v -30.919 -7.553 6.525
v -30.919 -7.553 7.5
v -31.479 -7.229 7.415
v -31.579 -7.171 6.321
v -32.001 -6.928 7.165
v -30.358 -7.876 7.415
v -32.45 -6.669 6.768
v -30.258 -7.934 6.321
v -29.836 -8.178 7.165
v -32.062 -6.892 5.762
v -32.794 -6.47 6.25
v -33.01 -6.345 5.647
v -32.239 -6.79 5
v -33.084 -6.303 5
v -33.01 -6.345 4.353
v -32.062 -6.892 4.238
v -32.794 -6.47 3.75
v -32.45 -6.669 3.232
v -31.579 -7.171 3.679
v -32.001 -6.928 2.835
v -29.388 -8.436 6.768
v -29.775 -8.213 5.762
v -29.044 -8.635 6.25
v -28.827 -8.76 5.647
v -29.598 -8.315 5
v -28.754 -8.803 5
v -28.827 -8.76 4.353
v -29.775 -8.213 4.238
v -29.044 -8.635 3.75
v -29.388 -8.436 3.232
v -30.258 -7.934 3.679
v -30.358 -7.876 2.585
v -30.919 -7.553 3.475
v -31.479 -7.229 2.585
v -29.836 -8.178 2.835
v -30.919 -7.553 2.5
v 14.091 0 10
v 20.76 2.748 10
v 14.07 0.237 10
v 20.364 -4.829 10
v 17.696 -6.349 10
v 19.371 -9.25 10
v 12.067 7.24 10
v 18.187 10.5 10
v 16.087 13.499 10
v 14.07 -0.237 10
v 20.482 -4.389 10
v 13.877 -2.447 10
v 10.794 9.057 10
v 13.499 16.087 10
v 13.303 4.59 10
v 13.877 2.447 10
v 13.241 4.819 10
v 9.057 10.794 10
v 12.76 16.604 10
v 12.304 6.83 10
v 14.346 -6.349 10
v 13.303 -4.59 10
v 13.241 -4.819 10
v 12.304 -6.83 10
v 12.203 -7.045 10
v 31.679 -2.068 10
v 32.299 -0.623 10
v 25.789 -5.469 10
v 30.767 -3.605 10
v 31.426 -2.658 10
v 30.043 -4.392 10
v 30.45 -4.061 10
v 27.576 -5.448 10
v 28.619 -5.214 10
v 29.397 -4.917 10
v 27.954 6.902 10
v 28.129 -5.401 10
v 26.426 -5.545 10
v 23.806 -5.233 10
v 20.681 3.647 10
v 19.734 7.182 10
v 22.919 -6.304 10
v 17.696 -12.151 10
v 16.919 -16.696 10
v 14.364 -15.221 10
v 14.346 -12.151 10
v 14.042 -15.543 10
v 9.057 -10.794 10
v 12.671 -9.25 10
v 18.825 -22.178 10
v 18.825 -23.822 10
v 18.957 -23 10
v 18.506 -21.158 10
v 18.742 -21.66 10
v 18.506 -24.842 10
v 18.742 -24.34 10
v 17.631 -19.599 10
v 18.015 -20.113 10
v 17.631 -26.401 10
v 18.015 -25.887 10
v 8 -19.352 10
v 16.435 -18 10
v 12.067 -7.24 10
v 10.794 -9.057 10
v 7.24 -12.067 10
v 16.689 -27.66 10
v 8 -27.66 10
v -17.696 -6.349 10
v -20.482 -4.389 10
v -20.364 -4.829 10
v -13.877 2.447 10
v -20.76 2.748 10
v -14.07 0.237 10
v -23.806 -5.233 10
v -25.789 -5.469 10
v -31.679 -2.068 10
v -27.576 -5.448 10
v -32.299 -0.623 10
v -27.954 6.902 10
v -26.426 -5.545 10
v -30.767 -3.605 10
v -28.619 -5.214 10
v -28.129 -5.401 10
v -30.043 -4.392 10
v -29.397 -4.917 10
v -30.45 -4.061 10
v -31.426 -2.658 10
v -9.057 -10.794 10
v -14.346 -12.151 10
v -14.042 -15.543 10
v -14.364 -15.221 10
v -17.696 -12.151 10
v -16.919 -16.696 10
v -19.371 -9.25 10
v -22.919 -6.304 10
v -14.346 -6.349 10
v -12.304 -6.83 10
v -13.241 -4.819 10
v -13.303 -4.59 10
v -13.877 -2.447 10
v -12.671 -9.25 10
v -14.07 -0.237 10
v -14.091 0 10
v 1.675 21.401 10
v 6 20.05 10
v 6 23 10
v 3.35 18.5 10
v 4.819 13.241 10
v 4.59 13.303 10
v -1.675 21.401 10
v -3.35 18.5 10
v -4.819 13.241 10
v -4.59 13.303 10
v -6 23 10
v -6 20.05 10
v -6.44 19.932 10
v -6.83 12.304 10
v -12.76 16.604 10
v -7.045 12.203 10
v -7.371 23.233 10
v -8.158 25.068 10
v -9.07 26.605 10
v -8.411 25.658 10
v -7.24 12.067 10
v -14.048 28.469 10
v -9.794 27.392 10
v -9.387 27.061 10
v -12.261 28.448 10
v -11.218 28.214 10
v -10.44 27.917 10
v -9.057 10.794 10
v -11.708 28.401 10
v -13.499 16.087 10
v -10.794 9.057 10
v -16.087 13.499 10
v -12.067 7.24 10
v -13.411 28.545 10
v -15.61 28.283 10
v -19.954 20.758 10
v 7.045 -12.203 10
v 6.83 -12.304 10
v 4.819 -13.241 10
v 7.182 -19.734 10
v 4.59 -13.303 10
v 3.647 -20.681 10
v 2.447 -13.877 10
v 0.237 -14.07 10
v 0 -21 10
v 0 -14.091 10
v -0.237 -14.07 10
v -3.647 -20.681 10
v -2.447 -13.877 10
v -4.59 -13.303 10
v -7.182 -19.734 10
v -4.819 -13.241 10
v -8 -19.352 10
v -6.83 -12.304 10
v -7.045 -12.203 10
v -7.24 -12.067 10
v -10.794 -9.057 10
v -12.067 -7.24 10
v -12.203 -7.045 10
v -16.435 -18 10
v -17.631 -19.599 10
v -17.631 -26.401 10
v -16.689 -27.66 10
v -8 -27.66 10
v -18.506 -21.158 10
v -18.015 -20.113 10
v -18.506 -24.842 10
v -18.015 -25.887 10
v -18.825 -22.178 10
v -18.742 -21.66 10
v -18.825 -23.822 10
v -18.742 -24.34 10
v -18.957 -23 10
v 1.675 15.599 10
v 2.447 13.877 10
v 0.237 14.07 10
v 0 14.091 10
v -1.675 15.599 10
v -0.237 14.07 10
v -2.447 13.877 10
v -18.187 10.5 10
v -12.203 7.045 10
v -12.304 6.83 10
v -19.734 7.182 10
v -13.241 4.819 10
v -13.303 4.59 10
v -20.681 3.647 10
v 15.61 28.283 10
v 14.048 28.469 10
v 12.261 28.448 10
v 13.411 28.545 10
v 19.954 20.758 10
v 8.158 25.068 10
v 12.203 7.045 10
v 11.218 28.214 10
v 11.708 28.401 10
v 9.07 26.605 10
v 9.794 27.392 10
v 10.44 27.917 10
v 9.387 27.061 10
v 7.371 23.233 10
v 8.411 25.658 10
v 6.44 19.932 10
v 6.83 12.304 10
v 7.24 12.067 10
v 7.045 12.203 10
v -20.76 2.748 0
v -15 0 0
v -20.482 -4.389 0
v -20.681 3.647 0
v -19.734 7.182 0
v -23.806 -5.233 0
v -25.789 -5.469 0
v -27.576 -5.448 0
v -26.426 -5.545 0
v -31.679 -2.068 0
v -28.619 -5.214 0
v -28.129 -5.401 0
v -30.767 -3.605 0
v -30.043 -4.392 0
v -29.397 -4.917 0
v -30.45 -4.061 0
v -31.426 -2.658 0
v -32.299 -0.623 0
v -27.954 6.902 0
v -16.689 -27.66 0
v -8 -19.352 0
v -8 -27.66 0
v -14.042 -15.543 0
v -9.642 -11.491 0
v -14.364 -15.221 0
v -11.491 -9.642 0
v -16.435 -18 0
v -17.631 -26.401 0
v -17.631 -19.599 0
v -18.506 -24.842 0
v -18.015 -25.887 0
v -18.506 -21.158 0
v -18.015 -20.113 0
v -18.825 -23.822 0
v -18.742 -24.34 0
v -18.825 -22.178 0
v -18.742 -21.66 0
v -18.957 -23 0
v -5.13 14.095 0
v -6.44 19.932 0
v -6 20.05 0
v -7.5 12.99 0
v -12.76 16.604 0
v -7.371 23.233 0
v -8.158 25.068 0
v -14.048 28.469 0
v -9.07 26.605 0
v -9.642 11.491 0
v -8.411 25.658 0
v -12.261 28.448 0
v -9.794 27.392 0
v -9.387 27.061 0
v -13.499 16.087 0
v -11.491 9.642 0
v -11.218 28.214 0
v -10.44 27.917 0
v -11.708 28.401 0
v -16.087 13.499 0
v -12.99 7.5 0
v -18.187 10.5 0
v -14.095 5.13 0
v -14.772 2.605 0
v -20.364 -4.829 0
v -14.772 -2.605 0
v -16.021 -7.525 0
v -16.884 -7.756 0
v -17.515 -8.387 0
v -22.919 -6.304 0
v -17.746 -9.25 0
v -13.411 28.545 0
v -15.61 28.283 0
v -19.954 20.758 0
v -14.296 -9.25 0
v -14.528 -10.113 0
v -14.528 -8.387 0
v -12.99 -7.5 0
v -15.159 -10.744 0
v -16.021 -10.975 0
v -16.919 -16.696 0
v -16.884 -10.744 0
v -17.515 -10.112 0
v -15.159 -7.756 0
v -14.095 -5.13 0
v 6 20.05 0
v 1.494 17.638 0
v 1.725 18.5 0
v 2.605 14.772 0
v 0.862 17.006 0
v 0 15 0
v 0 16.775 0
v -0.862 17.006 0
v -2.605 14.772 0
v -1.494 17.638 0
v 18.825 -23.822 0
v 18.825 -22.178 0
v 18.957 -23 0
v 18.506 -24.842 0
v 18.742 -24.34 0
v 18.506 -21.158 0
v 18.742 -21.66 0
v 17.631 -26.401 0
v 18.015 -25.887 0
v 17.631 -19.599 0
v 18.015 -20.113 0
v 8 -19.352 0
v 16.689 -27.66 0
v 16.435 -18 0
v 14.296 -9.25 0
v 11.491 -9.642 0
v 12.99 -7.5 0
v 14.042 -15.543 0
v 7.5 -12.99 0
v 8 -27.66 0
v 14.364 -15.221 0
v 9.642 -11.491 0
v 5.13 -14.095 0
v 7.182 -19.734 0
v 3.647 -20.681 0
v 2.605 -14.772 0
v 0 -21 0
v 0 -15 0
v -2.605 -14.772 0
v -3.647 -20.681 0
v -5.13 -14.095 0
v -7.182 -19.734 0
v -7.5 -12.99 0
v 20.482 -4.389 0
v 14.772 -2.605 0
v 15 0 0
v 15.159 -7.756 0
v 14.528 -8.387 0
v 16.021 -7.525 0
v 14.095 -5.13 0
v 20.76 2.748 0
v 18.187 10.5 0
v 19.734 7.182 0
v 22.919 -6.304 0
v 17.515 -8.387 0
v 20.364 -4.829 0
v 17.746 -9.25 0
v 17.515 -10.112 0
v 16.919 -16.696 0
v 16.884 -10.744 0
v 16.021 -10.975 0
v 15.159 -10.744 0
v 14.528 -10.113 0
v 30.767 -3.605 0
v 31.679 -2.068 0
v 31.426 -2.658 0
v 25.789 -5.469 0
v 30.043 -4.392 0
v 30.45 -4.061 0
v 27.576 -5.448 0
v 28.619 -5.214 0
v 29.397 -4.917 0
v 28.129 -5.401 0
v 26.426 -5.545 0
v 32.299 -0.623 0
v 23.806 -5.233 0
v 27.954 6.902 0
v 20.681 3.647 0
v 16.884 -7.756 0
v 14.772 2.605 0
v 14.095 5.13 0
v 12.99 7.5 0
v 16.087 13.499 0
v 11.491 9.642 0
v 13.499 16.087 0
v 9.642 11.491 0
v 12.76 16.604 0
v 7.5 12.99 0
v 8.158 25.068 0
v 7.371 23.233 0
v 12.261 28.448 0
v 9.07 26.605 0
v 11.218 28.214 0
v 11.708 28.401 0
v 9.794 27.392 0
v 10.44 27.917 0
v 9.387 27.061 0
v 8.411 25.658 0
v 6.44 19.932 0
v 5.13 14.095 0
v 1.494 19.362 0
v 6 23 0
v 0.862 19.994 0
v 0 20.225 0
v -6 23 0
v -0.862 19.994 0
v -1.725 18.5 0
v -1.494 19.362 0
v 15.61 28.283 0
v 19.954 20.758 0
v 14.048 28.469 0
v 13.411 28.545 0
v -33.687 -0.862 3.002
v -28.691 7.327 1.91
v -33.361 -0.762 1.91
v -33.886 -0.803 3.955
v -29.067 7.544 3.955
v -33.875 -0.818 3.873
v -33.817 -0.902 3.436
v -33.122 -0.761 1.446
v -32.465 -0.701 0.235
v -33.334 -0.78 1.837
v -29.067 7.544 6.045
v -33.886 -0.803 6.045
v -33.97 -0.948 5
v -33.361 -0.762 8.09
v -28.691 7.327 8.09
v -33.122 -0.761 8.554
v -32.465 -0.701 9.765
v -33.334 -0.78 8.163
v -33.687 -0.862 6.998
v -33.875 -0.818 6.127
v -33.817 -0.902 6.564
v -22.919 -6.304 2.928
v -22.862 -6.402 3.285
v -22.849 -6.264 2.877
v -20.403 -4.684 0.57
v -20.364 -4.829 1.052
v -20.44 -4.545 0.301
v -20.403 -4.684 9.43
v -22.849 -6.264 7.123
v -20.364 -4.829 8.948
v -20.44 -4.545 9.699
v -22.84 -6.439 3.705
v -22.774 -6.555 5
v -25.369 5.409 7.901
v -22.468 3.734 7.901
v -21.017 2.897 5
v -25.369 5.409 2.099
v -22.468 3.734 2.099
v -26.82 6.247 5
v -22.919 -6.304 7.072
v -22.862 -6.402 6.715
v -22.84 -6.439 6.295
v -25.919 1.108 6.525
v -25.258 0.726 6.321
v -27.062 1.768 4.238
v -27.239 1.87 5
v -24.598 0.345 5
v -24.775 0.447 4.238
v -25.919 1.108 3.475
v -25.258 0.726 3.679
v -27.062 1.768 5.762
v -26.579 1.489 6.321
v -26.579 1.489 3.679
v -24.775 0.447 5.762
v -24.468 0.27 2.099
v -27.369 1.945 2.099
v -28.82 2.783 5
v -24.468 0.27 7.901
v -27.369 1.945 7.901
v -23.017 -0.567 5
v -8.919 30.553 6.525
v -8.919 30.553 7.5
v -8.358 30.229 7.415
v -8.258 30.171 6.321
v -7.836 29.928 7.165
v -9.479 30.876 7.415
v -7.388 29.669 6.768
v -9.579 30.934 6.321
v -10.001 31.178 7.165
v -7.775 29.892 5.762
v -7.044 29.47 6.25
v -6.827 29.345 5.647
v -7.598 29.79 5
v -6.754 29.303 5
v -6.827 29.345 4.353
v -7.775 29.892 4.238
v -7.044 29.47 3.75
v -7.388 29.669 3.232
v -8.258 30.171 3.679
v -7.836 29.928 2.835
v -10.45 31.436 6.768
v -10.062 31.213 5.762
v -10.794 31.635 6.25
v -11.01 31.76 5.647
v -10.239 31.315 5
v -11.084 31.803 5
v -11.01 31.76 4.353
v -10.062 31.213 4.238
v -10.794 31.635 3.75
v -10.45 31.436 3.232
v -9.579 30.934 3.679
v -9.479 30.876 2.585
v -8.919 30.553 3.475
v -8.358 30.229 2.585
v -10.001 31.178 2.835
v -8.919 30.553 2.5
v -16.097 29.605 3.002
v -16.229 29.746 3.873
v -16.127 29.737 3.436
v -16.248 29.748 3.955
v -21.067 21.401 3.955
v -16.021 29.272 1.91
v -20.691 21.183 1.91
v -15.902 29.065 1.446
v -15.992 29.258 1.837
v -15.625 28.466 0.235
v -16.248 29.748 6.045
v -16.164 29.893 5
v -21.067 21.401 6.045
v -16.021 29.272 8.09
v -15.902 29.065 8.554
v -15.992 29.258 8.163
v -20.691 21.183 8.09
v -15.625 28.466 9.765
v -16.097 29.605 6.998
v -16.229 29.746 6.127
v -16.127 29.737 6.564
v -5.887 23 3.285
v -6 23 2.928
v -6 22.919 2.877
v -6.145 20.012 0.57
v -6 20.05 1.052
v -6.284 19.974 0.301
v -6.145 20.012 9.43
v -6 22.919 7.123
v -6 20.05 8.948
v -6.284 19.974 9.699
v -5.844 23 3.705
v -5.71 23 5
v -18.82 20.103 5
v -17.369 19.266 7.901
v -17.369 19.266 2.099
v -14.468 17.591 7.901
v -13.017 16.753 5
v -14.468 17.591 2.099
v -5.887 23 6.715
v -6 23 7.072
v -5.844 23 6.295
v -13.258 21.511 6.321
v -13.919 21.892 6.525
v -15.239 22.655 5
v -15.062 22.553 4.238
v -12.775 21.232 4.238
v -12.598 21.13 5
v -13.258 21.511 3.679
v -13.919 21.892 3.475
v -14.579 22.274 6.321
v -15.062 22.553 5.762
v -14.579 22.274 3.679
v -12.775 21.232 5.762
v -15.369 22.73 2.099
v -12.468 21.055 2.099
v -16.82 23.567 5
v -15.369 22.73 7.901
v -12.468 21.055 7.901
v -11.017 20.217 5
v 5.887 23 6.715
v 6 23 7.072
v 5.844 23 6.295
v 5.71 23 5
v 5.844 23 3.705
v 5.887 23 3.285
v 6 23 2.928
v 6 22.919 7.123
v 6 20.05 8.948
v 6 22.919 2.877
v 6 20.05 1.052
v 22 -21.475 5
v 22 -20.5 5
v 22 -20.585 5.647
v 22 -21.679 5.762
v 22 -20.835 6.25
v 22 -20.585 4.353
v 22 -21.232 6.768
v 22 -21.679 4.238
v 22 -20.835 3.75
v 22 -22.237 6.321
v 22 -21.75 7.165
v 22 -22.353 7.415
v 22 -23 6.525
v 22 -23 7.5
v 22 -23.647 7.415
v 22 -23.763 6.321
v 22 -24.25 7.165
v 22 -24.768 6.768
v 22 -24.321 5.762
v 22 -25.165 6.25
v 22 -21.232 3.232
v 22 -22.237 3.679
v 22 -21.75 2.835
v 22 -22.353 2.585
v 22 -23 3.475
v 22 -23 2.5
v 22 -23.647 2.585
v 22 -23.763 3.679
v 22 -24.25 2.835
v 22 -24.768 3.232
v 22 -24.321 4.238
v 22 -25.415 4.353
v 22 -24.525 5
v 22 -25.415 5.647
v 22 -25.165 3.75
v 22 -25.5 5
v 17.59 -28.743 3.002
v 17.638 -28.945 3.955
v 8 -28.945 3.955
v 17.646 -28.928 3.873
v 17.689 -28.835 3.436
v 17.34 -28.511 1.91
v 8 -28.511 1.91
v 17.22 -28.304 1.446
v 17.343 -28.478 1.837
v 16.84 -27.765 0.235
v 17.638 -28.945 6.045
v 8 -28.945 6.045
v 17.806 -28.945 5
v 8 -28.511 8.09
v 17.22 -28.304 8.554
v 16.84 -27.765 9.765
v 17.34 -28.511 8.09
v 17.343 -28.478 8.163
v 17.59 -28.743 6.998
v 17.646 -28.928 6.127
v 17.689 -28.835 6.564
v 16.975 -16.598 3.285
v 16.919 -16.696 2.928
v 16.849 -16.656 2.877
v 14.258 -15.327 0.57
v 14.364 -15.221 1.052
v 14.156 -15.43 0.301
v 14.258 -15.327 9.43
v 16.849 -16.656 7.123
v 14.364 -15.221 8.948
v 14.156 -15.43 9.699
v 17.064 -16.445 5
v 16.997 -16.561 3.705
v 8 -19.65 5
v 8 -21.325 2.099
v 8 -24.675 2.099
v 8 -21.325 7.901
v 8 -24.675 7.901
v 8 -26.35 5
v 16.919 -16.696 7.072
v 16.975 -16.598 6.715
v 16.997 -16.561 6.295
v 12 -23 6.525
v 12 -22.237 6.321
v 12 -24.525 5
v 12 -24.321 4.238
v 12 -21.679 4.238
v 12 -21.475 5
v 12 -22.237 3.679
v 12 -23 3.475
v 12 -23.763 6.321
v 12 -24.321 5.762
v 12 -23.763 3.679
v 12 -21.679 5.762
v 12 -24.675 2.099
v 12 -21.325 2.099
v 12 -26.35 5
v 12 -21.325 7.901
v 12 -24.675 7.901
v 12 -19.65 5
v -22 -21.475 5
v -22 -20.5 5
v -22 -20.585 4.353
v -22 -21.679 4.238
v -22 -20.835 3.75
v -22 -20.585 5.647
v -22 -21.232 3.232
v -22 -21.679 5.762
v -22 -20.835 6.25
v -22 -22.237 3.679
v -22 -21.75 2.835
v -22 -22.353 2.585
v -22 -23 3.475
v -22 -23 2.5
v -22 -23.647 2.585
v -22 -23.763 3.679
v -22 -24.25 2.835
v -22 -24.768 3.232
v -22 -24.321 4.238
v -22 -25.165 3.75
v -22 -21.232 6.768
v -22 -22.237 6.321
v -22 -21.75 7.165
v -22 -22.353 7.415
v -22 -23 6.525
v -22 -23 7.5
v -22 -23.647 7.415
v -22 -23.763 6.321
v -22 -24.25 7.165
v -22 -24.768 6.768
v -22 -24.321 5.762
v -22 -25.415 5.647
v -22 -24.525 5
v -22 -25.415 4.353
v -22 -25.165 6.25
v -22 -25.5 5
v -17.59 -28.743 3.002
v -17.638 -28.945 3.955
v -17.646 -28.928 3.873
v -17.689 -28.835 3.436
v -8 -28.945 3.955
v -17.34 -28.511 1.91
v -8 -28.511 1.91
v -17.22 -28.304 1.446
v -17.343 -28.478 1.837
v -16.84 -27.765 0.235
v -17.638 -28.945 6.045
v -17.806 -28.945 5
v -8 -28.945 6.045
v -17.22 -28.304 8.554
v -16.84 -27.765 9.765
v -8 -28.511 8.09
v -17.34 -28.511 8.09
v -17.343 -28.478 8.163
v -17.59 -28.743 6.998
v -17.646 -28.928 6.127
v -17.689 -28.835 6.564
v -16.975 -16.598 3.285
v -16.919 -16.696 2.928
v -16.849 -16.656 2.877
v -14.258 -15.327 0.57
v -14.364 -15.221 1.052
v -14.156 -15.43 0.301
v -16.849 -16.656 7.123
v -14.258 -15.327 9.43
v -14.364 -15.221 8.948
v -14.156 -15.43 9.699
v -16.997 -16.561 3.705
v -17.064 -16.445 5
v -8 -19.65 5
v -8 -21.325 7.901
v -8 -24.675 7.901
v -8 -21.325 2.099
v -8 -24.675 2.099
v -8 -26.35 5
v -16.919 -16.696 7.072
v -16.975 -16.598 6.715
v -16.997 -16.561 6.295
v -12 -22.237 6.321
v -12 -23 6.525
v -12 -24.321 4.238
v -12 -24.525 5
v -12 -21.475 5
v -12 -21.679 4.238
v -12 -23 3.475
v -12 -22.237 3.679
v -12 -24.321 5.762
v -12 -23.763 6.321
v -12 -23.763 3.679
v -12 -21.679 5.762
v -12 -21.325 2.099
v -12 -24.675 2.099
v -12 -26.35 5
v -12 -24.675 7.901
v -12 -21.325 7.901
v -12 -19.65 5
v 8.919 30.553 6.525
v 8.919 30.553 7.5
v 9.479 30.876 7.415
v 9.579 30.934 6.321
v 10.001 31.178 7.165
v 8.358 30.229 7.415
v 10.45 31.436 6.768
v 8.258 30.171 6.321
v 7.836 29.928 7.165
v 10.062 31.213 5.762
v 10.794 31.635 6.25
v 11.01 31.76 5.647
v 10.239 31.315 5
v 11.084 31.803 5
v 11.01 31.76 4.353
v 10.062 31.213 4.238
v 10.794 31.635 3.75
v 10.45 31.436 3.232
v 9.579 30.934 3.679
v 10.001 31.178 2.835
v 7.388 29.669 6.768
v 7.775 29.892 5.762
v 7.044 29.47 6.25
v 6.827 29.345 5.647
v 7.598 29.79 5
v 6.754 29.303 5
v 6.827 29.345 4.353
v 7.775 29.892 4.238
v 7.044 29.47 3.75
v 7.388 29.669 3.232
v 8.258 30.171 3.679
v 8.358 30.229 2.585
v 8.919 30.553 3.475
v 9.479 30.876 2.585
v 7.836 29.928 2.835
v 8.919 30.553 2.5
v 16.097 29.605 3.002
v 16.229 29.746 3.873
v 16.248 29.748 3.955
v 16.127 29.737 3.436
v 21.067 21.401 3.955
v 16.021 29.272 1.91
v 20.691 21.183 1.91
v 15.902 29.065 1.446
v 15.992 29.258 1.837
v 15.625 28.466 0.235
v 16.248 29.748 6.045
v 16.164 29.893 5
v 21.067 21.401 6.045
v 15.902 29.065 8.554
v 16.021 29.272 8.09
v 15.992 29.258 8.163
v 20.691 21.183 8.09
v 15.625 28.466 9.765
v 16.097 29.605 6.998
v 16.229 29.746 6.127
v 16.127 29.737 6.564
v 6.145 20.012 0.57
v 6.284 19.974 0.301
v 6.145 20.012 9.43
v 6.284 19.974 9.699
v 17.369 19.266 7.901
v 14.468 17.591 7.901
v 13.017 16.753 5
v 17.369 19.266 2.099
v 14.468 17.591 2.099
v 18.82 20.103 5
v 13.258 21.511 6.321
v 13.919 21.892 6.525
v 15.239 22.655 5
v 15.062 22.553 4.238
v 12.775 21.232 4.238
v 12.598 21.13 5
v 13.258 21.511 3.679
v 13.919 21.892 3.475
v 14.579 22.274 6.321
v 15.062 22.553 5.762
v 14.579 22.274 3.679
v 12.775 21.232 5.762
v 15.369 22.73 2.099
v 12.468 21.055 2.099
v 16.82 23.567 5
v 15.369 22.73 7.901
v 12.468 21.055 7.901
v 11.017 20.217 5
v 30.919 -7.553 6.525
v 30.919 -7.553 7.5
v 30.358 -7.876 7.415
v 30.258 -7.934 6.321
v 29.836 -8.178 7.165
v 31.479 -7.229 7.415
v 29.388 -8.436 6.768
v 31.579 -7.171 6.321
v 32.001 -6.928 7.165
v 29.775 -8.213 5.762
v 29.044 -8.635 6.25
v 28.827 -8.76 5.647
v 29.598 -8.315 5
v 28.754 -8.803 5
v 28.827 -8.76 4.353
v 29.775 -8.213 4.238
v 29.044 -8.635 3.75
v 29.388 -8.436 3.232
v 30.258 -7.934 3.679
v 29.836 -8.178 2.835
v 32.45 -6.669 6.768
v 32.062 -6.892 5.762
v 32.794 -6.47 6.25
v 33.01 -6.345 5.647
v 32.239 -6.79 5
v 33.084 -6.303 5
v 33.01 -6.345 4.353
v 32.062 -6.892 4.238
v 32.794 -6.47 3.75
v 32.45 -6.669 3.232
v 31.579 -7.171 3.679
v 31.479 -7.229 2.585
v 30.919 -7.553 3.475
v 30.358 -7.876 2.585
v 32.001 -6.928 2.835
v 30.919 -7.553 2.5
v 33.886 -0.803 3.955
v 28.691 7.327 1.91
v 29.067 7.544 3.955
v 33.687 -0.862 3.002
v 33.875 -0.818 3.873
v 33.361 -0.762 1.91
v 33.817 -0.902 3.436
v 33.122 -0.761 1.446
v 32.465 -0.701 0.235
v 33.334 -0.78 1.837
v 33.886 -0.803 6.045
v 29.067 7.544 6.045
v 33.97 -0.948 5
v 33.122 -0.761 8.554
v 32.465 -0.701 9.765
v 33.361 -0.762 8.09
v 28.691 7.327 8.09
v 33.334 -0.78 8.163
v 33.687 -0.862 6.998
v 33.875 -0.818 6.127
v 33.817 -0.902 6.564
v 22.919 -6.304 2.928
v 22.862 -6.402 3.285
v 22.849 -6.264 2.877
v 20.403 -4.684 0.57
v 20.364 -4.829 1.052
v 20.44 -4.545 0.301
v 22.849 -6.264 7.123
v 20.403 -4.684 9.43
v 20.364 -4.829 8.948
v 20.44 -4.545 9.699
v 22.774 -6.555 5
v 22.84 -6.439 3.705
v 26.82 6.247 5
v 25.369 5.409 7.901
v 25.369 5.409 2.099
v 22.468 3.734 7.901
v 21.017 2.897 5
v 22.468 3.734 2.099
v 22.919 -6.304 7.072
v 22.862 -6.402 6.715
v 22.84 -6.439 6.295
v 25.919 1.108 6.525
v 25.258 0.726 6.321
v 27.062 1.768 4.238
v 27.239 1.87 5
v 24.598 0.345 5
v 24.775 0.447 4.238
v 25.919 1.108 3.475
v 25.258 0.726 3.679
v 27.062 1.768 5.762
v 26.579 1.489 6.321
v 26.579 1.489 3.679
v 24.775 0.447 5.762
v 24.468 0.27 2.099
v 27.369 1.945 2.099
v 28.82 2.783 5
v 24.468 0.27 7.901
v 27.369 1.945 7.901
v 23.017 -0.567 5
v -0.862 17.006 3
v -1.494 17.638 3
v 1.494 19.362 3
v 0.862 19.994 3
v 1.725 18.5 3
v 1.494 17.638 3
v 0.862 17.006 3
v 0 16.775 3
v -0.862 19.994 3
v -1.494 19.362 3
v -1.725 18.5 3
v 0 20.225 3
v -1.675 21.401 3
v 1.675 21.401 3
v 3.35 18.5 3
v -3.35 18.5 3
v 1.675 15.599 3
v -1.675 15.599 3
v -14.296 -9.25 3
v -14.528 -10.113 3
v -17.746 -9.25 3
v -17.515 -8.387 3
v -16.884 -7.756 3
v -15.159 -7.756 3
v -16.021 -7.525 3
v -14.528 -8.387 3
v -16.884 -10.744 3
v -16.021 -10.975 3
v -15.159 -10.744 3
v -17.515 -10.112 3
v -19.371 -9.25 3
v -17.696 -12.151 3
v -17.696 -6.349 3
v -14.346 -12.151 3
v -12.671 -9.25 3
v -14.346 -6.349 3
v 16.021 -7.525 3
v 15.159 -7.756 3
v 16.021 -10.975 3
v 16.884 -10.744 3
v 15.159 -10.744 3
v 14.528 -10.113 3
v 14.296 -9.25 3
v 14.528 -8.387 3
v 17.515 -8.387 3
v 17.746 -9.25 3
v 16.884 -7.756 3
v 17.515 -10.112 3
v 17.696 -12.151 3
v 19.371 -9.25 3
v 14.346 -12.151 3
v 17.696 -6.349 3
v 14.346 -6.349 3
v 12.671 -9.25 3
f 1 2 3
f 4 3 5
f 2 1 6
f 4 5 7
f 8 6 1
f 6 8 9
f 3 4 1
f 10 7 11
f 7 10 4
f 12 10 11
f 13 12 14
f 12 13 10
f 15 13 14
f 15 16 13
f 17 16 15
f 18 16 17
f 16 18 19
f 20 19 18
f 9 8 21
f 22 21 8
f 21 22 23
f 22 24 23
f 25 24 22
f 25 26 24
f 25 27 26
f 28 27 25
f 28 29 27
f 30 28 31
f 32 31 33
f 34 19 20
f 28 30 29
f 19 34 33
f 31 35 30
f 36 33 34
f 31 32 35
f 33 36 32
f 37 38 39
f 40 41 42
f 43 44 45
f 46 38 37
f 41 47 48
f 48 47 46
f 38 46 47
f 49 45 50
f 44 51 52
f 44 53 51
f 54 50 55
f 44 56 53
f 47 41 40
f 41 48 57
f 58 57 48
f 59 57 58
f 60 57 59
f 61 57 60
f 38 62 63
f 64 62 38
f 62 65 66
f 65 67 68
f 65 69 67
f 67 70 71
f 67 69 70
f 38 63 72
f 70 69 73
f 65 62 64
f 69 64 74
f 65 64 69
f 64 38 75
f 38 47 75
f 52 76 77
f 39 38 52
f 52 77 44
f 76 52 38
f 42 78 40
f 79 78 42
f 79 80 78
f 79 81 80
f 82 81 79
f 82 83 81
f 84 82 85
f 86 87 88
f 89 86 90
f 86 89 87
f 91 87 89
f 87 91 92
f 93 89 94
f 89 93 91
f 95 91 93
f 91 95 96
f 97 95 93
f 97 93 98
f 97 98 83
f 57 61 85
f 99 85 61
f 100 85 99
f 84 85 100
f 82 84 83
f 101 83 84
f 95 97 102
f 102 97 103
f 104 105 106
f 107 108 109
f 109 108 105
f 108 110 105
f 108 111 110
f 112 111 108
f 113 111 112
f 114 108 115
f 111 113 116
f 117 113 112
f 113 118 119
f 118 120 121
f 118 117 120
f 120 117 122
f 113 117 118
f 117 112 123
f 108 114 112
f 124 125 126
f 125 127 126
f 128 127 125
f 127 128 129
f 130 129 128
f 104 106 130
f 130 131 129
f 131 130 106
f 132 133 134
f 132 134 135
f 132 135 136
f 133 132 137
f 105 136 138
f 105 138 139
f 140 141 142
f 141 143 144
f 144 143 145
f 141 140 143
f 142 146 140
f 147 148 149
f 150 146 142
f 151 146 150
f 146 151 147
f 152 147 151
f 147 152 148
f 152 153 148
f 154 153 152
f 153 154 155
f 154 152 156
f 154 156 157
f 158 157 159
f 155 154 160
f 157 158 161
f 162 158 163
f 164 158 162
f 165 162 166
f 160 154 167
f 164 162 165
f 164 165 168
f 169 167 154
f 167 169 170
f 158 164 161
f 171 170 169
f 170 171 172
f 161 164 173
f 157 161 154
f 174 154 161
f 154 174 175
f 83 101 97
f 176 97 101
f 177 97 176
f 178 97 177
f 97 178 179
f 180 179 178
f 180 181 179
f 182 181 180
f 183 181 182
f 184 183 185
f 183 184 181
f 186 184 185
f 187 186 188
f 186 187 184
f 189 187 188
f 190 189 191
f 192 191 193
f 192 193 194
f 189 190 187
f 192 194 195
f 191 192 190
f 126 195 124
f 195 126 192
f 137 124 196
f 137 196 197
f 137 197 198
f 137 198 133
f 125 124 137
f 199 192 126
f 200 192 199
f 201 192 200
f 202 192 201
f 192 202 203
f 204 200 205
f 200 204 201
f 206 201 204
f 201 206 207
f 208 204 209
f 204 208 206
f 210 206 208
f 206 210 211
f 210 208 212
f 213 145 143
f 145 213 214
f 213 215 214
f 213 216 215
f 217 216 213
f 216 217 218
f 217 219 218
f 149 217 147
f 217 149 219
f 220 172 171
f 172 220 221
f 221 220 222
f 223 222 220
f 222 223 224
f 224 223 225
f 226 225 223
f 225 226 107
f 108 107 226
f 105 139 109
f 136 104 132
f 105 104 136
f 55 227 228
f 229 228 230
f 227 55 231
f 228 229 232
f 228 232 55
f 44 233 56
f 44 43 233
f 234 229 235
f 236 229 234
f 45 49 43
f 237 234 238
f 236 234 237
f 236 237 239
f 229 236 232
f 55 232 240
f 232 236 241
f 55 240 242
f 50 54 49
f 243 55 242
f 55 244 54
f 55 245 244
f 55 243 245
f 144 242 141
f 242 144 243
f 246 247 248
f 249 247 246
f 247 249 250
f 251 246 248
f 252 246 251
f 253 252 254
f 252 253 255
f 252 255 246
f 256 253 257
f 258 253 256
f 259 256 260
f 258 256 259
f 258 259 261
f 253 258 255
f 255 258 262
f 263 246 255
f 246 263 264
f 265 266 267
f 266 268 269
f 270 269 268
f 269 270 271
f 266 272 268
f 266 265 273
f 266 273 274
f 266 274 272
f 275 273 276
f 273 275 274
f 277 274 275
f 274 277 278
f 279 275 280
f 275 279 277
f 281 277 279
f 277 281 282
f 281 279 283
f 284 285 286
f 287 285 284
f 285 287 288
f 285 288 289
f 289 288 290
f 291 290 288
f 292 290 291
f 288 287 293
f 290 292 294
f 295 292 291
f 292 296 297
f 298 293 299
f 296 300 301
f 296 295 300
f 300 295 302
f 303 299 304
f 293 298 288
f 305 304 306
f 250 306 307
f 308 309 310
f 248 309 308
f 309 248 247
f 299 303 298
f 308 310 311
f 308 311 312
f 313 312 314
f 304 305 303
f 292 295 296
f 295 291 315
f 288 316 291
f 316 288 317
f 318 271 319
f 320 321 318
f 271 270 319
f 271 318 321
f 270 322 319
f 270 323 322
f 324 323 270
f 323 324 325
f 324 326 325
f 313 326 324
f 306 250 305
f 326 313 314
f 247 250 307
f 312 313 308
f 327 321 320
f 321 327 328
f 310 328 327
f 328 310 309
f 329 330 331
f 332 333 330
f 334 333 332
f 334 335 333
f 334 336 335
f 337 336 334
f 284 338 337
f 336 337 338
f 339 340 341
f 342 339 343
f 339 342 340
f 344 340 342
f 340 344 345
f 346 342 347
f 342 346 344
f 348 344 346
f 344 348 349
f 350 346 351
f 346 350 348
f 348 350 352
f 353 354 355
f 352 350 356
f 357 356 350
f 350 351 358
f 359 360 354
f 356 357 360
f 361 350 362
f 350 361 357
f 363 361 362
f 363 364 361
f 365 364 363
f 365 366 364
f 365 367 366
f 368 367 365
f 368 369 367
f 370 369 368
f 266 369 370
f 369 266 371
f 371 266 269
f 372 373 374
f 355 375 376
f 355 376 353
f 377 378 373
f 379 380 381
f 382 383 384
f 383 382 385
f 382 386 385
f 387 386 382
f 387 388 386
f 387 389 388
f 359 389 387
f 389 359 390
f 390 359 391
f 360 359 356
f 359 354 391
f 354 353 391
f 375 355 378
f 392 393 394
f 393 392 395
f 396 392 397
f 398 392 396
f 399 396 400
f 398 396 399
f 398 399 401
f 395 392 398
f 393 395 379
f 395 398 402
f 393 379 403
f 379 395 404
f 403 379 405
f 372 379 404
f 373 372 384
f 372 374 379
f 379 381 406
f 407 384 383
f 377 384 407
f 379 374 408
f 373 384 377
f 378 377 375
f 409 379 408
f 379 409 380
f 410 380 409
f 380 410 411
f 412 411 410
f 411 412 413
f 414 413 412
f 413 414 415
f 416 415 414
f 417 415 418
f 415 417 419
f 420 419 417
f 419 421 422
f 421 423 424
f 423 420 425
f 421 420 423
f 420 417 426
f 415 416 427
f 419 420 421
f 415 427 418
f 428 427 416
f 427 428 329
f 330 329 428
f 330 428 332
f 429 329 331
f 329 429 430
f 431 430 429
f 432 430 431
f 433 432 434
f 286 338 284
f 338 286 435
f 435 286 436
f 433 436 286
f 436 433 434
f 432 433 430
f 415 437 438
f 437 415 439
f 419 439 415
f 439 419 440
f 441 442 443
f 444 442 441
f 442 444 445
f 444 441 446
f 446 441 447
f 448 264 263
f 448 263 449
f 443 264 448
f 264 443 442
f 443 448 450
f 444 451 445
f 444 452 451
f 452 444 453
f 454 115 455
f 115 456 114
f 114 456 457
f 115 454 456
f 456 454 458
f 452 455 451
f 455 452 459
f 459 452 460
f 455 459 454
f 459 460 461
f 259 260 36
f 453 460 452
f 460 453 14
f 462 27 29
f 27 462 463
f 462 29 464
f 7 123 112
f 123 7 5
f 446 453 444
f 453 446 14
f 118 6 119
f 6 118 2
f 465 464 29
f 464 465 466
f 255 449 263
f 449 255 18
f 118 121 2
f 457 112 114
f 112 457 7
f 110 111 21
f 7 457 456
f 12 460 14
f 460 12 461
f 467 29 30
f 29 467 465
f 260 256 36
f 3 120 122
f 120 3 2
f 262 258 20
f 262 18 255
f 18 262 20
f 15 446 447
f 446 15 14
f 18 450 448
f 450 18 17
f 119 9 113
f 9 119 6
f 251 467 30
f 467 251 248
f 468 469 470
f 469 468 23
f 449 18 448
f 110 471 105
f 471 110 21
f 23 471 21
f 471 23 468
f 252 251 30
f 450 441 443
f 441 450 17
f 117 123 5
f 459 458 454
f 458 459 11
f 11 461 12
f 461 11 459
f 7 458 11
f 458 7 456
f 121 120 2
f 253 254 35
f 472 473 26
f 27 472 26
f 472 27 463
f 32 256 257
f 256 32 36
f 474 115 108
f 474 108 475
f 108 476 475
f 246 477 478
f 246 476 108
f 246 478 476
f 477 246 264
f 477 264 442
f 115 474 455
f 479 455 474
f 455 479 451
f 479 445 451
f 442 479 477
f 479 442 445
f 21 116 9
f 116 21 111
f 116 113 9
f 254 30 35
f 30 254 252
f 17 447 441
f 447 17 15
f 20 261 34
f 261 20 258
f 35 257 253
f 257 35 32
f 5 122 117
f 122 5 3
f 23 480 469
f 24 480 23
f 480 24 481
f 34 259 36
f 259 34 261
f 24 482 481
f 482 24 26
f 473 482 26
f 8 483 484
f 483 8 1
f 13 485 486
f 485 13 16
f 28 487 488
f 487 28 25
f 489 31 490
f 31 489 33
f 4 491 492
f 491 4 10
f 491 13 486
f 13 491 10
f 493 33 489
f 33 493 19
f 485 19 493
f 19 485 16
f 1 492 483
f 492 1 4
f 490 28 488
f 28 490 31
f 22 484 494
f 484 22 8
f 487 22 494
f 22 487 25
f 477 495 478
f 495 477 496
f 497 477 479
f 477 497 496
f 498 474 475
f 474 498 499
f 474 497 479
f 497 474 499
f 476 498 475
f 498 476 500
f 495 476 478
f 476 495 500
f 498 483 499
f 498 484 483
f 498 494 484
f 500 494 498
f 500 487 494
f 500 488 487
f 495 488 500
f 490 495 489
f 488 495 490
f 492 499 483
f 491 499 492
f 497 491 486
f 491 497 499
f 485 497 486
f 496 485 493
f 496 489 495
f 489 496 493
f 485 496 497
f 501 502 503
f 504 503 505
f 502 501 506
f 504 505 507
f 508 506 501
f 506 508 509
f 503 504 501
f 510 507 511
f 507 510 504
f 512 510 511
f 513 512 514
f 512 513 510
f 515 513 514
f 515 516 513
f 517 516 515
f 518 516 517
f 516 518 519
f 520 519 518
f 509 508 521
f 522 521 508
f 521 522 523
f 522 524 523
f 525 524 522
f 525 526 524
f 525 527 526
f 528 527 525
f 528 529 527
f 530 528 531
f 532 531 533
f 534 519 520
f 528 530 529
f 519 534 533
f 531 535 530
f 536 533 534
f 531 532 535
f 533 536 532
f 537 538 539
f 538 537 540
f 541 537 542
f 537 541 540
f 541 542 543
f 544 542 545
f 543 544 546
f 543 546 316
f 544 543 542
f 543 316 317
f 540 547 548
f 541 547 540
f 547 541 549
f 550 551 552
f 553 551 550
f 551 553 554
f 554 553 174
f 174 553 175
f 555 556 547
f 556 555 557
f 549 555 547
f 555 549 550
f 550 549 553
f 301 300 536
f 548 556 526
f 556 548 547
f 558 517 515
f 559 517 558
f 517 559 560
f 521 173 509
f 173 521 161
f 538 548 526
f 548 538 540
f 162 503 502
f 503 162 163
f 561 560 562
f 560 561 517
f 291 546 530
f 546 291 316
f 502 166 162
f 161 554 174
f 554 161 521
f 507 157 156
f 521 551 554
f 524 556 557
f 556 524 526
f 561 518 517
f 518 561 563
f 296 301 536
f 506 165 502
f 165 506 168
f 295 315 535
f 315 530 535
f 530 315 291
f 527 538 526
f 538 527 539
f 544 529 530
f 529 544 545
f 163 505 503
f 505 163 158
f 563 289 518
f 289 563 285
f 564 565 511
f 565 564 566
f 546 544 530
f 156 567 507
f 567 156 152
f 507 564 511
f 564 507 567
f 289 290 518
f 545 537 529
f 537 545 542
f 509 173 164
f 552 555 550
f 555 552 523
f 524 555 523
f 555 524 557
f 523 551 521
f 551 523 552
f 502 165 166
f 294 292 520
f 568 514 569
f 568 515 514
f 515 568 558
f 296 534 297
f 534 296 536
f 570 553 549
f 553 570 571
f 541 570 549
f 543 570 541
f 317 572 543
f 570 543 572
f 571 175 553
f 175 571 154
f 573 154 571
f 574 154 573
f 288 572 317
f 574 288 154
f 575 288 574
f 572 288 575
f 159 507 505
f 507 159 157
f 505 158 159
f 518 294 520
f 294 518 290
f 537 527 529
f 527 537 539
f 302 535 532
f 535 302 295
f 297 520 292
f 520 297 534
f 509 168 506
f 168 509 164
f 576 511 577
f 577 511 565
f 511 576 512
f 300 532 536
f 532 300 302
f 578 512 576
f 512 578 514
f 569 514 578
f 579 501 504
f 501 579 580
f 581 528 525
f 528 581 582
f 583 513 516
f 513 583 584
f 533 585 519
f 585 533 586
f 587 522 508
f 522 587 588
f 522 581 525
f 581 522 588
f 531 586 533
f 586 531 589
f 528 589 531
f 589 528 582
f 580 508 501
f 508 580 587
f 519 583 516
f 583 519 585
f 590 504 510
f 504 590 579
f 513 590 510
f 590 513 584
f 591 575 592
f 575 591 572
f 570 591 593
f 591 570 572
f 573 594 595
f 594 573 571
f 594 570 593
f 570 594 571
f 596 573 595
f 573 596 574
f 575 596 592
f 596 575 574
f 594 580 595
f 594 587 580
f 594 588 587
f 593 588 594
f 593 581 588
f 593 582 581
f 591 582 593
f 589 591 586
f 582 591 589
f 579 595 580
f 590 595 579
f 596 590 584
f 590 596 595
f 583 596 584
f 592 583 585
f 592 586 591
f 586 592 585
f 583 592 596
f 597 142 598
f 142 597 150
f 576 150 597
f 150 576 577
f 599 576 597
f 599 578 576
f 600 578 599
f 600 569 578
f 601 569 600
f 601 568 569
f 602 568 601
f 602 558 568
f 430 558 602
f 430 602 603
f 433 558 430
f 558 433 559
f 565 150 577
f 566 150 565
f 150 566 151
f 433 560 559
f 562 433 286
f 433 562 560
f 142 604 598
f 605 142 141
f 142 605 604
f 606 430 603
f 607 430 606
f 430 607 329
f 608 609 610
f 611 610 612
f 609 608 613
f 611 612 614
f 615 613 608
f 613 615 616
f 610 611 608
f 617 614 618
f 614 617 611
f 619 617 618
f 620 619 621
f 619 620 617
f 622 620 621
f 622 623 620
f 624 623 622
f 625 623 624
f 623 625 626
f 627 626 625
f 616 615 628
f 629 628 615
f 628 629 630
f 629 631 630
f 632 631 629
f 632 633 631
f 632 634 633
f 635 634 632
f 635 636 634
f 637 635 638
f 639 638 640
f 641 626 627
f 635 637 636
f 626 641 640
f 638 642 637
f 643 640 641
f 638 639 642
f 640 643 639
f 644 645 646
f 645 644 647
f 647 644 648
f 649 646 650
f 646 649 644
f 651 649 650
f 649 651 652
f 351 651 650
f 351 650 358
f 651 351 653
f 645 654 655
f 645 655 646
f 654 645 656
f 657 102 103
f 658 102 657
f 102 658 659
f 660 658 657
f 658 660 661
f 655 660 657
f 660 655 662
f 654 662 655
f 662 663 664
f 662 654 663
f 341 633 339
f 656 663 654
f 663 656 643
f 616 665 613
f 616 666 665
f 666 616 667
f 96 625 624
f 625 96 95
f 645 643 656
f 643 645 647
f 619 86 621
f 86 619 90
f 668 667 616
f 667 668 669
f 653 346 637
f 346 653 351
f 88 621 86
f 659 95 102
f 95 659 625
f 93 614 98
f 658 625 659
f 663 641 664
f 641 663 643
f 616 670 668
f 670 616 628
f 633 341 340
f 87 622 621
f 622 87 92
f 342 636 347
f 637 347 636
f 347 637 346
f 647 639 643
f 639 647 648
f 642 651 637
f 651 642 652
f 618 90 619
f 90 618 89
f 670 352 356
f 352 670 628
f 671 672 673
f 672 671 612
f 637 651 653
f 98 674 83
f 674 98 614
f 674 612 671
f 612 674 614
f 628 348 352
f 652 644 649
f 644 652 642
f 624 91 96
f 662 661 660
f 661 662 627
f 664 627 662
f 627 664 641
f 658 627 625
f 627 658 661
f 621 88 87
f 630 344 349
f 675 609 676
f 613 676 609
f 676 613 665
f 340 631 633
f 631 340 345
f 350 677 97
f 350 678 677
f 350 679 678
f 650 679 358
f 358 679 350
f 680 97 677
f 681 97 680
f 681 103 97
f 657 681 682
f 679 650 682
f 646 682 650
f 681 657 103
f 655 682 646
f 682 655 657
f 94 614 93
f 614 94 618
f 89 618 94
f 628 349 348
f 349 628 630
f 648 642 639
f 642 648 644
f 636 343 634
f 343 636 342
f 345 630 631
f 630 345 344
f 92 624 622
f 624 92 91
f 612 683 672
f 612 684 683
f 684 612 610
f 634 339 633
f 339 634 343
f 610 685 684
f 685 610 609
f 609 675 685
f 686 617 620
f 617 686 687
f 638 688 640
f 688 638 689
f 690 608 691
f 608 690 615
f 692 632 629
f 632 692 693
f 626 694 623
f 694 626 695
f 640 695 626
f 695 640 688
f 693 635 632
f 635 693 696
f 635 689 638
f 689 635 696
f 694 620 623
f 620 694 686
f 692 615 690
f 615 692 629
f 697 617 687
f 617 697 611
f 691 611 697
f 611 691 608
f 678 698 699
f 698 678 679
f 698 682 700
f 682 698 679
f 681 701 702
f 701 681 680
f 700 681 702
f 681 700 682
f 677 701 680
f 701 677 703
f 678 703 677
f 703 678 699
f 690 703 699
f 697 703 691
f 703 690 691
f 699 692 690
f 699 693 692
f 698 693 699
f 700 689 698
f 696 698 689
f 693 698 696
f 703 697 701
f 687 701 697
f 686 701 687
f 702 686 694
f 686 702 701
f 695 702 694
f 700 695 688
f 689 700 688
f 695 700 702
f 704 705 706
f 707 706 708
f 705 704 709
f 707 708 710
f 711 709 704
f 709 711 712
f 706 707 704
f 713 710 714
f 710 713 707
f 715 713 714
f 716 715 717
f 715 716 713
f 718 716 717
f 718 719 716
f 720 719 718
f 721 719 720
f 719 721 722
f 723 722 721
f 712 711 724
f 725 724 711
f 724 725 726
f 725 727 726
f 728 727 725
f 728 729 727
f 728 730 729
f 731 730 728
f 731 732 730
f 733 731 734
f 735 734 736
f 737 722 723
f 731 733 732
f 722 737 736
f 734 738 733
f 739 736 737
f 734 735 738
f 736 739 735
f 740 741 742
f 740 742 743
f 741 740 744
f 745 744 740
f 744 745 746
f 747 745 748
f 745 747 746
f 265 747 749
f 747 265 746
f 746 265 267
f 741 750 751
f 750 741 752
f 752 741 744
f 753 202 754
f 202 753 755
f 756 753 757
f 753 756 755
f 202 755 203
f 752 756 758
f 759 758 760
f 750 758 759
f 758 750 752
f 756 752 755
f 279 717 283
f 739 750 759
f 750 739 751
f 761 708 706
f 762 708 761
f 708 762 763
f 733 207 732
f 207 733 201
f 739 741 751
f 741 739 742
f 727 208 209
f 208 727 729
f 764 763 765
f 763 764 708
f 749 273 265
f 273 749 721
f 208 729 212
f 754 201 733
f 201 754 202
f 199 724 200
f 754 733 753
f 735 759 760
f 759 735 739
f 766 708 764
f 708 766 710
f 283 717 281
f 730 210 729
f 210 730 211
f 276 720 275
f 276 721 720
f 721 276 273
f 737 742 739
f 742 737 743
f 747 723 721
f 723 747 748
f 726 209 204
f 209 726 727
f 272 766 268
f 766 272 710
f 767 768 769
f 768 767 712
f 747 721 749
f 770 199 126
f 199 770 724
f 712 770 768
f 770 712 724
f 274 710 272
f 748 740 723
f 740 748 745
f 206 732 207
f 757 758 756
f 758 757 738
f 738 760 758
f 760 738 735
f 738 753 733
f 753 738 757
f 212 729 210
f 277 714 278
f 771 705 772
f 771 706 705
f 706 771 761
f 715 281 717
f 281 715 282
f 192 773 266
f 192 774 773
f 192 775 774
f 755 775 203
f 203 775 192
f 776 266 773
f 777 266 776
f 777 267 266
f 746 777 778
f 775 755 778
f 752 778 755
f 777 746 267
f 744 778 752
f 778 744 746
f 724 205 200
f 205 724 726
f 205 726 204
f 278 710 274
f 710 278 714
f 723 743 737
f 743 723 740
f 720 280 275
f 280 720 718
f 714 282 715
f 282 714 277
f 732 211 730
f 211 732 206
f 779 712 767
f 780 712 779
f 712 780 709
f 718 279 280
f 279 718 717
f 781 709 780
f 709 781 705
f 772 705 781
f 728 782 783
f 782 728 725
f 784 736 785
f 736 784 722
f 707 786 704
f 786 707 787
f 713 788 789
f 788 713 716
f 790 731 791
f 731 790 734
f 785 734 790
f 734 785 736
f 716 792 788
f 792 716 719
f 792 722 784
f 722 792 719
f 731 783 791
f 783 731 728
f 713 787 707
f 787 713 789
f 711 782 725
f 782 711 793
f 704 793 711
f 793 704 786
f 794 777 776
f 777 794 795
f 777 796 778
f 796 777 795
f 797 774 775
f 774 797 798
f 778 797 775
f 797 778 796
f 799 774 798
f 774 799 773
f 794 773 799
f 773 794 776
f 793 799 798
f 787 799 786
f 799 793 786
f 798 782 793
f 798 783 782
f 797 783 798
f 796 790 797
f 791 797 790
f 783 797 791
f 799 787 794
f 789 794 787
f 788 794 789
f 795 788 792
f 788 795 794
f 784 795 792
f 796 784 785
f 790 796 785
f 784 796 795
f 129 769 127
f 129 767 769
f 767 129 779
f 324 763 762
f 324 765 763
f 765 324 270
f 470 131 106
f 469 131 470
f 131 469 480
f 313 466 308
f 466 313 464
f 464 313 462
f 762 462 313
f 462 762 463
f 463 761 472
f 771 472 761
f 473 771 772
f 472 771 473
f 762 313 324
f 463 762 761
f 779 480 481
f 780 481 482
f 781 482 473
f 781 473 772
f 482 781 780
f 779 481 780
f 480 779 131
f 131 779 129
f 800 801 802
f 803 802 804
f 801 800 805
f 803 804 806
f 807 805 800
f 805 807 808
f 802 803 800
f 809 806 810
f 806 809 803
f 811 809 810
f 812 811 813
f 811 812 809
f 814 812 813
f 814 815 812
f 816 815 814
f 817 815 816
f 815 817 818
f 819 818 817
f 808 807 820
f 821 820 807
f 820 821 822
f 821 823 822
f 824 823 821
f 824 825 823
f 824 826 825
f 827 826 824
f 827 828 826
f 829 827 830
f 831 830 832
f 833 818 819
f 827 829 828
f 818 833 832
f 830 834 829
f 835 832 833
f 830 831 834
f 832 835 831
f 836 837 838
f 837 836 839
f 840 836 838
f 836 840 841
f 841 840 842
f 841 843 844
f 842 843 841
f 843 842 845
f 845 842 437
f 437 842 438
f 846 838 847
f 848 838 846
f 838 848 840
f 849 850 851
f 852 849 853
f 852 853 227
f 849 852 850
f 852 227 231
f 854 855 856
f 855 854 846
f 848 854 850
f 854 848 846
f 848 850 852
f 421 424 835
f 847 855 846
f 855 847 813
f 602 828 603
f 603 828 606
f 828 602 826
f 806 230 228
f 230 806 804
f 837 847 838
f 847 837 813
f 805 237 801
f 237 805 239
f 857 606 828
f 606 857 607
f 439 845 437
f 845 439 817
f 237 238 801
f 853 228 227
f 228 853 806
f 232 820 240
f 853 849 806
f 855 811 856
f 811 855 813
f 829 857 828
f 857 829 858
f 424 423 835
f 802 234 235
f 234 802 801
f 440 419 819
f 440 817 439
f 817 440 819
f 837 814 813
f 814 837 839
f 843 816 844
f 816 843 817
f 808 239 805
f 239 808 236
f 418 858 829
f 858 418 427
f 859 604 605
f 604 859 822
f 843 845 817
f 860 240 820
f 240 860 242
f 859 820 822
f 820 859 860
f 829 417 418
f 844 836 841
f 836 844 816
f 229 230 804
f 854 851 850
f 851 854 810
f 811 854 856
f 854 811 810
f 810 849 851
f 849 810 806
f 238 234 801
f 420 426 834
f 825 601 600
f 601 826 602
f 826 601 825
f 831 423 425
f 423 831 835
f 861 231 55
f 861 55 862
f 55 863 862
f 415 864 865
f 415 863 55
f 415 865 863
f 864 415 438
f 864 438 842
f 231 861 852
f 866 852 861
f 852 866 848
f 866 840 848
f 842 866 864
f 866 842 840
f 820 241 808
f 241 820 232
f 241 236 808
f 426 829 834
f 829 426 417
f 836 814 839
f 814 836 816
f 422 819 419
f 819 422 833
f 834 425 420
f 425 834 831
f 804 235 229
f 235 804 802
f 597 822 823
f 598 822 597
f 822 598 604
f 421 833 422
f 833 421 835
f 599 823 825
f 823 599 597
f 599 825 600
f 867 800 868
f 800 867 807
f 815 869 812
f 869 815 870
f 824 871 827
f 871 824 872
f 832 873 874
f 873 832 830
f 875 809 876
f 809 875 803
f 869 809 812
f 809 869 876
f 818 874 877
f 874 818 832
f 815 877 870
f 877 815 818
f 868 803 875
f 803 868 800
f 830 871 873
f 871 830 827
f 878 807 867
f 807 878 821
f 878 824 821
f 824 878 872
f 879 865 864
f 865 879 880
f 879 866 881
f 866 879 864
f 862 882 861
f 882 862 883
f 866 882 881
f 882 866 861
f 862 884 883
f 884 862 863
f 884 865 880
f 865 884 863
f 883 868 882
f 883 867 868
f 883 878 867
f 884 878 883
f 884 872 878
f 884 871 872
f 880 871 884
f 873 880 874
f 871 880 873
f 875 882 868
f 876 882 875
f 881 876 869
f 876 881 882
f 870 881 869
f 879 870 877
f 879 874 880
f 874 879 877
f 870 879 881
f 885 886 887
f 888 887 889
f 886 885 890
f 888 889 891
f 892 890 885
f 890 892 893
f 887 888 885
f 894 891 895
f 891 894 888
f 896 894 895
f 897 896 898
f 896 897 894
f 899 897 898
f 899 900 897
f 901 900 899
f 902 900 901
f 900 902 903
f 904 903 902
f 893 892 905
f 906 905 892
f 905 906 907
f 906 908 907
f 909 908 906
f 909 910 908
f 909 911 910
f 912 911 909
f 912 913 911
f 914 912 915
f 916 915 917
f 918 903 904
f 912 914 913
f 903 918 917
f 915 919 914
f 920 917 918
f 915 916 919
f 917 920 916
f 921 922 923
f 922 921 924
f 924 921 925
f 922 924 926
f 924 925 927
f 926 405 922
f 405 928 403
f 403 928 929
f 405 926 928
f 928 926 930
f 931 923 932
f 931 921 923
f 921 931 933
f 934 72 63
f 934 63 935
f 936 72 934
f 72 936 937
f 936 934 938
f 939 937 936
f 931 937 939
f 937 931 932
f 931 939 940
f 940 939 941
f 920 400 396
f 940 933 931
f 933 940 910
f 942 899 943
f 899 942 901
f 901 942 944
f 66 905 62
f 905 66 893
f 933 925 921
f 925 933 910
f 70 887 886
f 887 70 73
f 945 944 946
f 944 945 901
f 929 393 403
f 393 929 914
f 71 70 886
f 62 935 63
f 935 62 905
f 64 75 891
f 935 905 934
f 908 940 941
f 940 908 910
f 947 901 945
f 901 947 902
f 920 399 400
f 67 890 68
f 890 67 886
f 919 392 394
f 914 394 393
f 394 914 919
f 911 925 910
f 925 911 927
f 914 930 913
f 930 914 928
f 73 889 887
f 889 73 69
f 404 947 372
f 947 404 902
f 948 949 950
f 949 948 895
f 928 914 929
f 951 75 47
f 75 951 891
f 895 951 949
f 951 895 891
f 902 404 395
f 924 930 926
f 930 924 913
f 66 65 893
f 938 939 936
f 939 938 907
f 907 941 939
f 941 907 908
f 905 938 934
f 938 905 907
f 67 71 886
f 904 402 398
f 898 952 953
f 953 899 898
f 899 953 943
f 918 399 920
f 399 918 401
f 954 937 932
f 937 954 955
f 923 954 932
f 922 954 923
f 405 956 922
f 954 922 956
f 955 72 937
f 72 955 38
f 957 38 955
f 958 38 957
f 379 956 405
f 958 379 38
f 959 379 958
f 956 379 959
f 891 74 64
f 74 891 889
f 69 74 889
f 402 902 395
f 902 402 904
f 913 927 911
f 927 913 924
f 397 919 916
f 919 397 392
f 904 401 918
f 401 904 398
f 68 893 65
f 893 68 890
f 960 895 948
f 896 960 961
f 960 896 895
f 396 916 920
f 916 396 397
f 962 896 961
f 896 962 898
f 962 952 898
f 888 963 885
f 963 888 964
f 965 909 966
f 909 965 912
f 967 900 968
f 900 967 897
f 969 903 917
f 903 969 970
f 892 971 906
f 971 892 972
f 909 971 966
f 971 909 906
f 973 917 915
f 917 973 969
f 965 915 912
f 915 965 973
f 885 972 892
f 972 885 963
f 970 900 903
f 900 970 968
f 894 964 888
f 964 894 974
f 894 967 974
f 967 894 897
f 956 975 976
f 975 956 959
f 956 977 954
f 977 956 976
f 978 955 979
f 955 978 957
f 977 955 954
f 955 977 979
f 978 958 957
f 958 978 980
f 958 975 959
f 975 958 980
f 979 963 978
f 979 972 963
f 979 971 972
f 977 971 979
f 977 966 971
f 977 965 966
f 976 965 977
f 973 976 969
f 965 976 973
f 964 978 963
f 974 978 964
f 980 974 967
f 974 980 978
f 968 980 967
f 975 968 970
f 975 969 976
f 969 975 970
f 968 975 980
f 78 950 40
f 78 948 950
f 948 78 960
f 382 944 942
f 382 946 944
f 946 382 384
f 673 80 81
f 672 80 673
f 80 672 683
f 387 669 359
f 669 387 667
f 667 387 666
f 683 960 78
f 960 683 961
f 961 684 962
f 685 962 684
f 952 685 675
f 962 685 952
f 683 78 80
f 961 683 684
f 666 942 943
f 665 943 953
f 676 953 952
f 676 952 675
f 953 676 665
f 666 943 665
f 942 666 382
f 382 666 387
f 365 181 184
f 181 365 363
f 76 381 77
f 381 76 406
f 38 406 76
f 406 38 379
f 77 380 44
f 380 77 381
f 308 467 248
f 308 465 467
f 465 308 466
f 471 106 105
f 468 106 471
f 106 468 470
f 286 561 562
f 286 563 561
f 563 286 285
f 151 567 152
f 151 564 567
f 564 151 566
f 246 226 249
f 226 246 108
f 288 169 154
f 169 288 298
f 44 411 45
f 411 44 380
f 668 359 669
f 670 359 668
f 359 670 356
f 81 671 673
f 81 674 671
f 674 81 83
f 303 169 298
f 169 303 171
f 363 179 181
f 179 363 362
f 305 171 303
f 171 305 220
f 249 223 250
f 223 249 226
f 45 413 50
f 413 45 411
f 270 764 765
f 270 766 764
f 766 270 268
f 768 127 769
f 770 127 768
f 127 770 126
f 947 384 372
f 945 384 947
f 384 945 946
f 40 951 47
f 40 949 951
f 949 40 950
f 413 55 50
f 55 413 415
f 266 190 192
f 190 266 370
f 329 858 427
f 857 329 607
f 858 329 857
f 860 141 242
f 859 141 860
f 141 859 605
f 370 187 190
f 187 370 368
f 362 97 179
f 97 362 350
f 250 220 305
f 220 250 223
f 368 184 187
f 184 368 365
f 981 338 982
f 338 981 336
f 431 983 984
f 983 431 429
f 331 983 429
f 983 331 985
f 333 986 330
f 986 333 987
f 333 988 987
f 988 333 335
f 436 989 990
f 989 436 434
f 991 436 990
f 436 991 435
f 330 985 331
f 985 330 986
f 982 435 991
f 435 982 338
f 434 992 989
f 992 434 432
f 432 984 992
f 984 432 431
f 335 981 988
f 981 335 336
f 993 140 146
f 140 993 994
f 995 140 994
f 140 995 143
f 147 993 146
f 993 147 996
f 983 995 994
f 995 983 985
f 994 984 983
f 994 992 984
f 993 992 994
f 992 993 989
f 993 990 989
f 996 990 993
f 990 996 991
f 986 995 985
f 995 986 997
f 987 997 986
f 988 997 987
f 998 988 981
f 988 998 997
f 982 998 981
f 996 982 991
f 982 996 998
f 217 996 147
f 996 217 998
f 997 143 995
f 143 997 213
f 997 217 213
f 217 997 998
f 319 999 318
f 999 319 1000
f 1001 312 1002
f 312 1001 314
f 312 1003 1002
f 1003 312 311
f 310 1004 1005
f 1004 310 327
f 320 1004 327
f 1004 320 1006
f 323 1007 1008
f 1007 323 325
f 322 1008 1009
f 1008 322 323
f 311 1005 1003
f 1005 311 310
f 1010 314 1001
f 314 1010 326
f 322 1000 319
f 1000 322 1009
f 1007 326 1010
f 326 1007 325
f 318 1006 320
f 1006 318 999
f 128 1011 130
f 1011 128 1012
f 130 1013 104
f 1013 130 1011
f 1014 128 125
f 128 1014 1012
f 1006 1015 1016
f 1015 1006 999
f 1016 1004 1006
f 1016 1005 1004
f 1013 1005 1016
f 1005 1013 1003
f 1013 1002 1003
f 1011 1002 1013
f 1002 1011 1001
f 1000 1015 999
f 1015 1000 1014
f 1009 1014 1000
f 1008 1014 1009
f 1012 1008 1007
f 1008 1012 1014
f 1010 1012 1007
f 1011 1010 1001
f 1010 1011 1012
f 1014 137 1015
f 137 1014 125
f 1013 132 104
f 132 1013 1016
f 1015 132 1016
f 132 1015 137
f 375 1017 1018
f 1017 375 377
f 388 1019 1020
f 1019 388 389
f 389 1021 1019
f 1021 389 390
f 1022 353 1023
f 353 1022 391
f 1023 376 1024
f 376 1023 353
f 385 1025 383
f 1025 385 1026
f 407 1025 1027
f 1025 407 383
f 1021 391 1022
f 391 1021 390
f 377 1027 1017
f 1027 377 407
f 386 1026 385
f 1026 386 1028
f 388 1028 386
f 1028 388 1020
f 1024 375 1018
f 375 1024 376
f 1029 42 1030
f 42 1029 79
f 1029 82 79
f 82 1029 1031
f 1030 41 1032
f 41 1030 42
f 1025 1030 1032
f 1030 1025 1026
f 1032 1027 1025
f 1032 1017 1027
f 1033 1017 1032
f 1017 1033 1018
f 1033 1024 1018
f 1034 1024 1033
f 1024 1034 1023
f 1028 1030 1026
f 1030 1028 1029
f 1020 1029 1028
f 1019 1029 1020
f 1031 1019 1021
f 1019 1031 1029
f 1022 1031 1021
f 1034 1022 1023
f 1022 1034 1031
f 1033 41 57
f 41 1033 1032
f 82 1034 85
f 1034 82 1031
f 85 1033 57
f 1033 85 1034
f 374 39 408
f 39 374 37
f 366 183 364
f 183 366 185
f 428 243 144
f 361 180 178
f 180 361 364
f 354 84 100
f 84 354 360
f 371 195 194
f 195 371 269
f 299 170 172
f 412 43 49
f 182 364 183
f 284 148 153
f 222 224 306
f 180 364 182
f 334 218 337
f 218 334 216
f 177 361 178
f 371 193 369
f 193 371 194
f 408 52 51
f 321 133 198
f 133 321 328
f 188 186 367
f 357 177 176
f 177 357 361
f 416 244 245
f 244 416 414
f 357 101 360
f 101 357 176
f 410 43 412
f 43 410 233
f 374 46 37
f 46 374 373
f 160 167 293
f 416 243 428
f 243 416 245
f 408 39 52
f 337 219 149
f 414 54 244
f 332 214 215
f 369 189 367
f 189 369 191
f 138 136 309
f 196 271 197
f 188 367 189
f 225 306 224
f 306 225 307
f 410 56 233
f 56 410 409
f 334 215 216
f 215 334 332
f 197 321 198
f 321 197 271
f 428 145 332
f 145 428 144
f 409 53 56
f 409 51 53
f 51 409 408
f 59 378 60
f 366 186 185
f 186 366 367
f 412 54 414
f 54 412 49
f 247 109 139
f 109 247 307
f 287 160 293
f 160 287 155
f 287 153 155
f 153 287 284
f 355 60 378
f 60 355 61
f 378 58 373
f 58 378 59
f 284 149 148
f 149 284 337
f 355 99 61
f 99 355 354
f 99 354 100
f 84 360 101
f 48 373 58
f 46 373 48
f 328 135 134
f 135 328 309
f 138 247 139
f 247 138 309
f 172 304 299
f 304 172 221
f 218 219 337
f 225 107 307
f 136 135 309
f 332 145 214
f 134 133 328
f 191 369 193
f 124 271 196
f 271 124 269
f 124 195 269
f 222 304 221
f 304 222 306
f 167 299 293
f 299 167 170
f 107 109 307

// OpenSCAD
// file: configuration.scad
// Increase this if your slicer or printer make holes too tight.
extra_radius = 0.1;

// OD = outside diameter, corner to corner.
m3_nut_od = 6.1;
m3_nut_radius = m3_nut_od/2 + 0.2 + extra_radius;

// Major diameter of metric 3mm thread.
m3_major = 2.85;
m3_radius = m3_major/2 + extra_radius;
m3_wide_radius = m3_major/2 + extra_radius + 0.2;

// OD = outside diameter, corner to corner.
m5_nut_od = 8.1;
m5_nut_radius = m5_nut_od/2 + 0.2 + extra_radius;

// Major diameter of metric 5mm thread.
m5_major = 4.85;
m5_radius = m5_major/2 + extra_radius;
m5_wide_radius = m5_major/2 + extra_radius + 0.2;

// NEMA17 stepper motors.
motor_shaft_diameter = 5;
motor_shaft_radius = motor_shaft_diameter/2 + extra_radius;

// Frame brackets. M3x8mm screws work best with 3.6 mm brackets.
thickness = 3.6;

// OpenBeam or Misumi. Currently only 15x15 mm, but there is a plan
// to make models more parametric and allow 20x20 mm in the future.
extrusion = 15;
// main file
include <configuration.scad>;

separation = 44;  // Distance between ball joint mounting faces.
offset = 23;  // Same as DELTA_EFFECTOR_OFFSET in Marlin.
mount_radius = 18.5;  // Hotend mounting screws, standard would be 25mm.
hotend_radius = 14;  // Hole for the hotend (J-Head diameter is 16mm).
height = 10;
cone_r1 = 2.5;
cone_r2 = 14;


module effector() {

	difference() {
		union() {
		    cylinder(r=offset-2, h=height, center=true, $fn=36);
		    
			for (a = [60:120:359]) rotate([0, 0, a]) {
				rotate([0, 0, 30]) translate([offset-2, 0, 0])
			    cube([4, 12, height], center=true);
				for (s = [-1, 1]) scale([s, 1, 1]) {
					translate([0, offset, 0]) difference() {
				    intersection() {
	    					cube([separation, 40, height], center=true);
						translate([0, -4, 0]) rotate([0, 90, 0])cylinder(r=10, h=separation, center=true);
				    		translate([separation/2-7, 0, 0]) rotate([0, 90, 0])cylinder(r1=cone_r2, r2=cone_r1, h=14, center=true, $fn=24);
				    }
		    			rotate([0, 90, 0])cylinder(r=m3_radius, h=separation+1, center=true, $fn=12);
	    				rotate([90, 0, 90])cylinder(r=m3_nut_radius, h=separation-20, center=true, $fn=6);
				}
			}
		}
	}
    translate([0, 0, -height/2])cylinder(r1=hotend_radius+1, r2=hotend_radius, h=height+1, $fn=36);
    

	for (a = [0:120:359]) rotate([0, 0, a]) {
	    translate([0, mount_radius, 0])cylinder(r=m3_wide_radius, h=2*height, center=true, $fn=12);	
		translate([0, mount_radius, 1.5])cylinder(r=m3_nut_radius, h=7, center=true, $fn=6);

    }
	
  }
}

translate([0, 0, height/2]) effector();
